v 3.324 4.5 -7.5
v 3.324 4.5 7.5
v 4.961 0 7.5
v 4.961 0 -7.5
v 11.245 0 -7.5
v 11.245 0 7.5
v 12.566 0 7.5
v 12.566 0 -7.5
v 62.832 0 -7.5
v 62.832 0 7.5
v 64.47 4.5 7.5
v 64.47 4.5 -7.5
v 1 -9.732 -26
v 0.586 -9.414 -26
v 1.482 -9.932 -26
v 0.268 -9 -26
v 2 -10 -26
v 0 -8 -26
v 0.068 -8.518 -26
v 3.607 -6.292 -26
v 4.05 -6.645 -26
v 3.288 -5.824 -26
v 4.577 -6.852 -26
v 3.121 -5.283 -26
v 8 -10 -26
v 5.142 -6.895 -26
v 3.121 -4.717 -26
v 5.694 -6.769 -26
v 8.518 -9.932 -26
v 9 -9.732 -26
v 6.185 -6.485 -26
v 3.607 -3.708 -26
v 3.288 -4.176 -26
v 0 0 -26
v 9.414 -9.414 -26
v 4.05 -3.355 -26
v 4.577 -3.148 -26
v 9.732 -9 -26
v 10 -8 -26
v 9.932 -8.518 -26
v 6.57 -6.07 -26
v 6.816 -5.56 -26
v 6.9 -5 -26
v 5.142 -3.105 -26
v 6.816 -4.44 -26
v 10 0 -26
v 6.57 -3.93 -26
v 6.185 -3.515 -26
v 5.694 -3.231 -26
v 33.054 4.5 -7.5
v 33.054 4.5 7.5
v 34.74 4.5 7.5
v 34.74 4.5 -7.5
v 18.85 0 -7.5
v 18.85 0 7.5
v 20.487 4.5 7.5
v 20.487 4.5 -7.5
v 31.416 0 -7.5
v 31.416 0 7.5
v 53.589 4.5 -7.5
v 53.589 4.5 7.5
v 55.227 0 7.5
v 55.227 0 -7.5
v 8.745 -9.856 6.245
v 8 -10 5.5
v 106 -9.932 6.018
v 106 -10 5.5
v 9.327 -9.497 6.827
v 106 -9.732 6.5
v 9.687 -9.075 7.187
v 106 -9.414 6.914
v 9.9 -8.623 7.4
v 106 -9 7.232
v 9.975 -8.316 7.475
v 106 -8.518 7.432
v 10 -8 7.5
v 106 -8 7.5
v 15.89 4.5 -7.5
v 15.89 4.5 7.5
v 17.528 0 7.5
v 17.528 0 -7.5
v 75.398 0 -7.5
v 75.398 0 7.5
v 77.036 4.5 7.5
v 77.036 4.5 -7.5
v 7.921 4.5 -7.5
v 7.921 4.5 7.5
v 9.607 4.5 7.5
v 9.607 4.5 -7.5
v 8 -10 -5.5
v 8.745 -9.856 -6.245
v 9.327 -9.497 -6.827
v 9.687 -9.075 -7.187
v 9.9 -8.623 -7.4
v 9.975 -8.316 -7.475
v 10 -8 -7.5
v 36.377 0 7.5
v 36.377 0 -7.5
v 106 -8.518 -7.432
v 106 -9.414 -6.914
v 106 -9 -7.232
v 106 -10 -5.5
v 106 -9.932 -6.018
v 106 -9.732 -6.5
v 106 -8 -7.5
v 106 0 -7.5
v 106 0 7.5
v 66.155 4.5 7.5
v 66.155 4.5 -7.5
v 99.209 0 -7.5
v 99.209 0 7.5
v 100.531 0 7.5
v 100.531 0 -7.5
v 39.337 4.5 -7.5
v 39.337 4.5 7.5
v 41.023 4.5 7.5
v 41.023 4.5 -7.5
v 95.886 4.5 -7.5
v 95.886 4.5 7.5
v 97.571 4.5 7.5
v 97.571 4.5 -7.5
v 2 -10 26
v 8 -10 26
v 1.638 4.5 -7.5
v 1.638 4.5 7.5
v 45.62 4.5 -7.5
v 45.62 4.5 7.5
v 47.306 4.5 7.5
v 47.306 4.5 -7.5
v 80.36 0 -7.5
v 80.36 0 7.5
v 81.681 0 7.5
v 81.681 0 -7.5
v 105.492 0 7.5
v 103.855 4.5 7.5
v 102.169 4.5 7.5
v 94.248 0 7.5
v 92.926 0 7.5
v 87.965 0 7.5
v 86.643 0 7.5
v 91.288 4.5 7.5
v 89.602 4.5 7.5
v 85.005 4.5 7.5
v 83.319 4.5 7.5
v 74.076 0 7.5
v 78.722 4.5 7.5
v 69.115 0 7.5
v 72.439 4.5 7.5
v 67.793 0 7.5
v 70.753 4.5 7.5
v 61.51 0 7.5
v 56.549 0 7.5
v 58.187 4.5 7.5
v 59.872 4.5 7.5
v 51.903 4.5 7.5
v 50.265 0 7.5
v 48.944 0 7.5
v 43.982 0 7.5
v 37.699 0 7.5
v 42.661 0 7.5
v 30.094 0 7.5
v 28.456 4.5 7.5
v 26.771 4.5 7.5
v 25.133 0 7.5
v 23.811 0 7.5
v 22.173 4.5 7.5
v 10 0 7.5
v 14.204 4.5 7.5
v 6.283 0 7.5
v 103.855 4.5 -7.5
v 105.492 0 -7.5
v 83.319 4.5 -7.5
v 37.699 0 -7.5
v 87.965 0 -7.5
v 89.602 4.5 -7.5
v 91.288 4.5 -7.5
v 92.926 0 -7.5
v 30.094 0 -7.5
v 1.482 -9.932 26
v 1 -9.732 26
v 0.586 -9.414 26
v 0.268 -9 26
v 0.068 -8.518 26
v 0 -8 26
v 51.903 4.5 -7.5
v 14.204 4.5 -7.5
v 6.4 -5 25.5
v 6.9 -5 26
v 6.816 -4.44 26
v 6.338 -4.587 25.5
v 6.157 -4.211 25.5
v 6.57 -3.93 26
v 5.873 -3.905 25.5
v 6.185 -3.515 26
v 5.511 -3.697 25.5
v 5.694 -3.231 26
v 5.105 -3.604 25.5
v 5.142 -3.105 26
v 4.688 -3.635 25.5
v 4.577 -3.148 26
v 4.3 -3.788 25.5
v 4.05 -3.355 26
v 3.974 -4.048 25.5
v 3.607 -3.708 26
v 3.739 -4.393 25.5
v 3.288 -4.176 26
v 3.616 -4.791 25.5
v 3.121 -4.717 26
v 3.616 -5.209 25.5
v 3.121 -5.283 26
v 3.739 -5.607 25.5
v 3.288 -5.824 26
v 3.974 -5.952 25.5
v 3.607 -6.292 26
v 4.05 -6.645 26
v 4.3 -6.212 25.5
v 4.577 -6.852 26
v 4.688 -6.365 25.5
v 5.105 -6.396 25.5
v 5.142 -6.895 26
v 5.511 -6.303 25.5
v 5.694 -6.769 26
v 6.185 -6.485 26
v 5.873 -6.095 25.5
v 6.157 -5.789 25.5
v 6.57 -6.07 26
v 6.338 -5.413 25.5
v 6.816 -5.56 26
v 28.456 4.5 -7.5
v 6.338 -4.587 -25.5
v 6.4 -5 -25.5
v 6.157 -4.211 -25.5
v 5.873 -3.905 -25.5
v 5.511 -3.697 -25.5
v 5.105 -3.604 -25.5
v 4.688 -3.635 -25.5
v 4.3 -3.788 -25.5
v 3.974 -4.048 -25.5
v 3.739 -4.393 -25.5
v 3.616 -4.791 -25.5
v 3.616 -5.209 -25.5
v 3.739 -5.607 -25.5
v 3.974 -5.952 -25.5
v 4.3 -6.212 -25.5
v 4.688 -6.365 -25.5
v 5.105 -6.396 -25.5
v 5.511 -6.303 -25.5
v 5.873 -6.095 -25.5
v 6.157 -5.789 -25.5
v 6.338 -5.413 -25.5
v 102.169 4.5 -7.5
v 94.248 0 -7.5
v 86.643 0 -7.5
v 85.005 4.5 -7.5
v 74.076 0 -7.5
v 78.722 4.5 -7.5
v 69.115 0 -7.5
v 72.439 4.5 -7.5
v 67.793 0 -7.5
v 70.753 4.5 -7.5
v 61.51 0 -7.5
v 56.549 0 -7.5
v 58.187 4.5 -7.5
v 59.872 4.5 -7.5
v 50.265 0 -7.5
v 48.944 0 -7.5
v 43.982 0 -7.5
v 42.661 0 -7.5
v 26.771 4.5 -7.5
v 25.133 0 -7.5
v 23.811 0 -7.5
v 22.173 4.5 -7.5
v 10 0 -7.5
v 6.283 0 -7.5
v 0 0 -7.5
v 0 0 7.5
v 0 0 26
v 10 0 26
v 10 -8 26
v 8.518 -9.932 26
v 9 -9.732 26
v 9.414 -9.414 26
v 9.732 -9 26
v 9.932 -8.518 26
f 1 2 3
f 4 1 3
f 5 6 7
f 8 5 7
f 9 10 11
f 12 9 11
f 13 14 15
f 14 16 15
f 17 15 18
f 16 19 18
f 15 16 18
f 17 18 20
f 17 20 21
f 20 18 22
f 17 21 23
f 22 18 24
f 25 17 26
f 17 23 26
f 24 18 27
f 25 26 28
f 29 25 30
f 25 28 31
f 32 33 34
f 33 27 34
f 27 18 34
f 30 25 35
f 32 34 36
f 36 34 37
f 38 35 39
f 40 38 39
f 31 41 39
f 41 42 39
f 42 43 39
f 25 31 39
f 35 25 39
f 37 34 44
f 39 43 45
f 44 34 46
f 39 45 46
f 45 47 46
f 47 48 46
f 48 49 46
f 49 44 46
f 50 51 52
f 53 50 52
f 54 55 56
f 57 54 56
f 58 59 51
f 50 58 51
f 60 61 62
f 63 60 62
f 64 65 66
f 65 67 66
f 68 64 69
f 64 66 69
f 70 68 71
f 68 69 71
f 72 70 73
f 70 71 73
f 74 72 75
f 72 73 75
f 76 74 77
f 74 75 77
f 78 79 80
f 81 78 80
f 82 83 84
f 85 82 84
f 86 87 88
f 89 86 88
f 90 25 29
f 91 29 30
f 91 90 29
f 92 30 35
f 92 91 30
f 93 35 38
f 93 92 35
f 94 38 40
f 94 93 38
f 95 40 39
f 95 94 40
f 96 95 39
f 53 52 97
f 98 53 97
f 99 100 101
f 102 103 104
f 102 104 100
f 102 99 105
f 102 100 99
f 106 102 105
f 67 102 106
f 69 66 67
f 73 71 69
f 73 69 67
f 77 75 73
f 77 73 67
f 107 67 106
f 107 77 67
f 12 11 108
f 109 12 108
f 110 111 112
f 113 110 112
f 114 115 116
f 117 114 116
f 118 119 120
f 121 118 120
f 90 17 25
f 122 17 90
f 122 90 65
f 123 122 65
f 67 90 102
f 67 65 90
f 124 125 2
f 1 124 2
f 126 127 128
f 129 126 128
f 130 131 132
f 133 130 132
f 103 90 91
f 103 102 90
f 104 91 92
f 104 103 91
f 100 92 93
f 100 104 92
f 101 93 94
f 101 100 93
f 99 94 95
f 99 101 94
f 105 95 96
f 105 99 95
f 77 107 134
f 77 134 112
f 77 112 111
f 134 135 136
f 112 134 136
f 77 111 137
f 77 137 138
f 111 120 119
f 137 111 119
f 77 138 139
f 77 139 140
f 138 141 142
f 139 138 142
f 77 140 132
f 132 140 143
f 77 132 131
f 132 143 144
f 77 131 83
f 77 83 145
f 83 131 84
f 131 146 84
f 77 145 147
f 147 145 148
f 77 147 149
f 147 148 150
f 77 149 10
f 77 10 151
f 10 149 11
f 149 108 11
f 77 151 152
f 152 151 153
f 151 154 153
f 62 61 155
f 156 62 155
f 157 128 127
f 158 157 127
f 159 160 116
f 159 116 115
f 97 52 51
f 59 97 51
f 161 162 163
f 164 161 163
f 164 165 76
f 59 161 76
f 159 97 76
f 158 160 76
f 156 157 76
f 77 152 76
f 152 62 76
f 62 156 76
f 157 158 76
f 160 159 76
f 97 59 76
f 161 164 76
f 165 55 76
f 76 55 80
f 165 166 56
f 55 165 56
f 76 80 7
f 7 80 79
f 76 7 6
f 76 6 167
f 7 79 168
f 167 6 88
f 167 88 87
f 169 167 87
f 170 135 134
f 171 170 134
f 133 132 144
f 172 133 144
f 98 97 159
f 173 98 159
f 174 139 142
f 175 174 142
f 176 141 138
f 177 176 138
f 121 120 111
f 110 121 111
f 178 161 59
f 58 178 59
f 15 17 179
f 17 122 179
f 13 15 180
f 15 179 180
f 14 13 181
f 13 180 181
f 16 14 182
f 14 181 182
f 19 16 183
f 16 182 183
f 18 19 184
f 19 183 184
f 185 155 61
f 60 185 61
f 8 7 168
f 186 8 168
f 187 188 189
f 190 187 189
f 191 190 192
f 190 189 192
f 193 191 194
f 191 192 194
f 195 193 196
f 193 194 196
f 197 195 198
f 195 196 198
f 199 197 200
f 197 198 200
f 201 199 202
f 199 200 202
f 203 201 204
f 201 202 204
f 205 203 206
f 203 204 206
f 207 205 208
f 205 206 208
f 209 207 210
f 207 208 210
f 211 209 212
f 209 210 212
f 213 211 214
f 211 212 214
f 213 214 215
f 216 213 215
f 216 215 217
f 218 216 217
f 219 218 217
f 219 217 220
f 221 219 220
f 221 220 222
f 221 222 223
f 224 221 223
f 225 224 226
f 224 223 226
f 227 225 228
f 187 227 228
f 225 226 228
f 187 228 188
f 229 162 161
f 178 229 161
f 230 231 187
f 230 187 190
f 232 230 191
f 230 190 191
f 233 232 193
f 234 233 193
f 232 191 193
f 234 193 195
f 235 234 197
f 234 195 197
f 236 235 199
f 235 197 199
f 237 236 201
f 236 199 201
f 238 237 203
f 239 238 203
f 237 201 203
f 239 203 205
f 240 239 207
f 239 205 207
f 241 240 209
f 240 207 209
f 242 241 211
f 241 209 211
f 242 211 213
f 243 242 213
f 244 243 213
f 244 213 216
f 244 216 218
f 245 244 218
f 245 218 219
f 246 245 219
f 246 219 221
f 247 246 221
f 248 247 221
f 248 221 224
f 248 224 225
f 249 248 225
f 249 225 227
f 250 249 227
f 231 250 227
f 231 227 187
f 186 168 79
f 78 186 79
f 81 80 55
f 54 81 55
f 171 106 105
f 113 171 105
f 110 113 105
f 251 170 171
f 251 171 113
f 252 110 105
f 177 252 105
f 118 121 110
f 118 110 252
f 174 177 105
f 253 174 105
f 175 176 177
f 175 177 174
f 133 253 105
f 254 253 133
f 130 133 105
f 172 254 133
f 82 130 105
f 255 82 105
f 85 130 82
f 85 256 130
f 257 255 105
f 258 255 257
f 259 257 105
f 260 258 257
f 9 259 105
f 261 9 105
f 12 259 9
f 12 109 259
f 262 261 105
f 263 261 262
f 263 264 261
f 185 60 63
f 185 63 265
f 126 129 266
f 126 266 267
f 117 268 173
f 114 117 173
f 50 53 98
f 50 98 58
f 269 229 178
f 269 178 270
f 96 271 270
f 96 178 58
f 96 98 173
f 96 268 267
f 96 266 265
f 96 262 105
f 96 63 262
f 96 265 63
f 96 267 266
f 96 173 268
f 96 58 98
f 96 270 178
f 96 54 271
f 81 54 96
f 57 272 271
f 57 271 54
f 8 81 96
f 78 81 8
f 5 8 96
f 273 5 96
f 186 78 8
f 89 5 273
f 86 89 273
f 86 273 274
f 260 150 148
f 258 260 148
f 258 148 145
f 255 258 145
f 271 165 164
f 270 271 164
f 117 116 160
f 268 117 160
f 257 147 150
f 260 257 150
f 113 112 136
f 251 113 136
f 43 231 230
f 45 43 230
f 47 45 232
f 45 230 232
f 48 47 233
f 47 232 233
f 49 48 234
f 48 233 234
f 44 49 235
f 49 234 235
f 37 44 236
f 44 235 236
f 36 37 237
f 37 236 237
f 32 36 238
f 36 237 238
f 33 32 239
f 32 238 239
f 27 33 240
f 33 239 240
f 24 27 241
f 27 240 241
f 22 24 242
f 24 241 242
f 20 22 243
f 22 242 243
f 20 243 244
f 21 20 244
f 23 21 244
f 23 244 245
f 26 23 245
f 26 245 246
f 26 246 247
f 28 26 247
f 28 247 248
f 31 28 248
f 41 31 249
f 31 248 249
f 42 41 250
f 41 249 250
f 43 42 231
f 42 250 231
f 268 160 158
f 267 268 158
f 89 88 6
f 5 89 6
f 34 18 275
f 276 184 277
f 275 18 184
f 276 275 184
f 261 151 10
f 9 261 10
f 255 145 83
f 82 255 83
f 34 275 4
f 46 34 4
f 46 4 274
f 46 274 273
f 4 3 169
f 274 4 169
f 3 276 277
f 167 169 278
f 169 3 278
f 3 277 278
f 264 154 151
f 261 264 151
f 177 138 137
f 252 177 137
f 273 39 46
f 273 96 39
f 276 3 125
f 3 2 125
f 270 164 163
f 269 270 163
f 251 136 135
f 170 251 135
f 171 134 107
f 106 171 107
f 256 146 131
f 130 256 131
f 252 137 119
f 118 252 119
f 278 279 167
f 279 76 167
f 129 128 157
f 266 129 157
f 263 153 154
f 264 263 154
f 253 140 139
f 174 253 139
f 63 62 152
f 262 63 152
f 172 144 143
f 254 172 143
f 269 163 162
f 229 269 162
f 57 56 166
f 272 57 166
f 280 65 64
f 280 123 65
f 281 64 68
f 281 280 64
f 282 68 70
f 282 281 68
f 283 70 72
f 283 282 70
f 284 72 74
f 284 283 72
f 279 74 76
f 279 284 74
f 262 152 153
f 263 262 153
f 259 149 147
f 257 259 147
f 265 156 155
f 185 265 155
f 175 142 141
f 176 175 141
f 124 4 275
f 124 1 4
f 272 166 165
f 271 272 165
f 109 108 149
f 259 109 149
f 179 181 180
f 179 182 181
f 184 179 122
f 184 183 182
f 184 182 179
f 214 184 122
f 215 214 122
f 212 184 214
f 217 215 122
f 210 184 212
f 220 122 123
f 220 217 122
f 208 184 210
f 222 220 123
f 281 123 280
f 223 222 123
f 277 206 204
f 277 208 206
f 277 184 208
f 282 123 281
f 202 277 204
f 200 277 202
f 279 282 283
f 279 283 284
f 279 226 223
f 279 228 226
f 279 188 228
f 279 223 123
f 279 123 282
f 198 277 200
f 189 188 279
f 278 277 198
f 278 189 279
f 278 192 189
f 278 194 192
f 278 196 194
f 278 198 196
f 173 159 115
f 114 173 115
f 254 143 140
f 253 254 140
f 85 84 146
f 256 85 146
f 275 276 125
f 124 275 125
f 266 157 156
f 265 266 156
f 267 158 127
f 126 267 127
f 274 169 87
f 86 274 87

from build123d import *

# Parameters (mm, degrees)
SKETCH_1_W             = 106
SKETCH_1_H             = 10
EXTRUDE_1_DEPTH        = 7.5
EXTRUDE_2_DEPTH        = 15
PATTERN_LINEAR_1_COUNT = 17
PATTERN_LINEAR_1_PITCH = 6.283185307
SKETCH_3_W             = 10
SKETCH_3_H             = 10
EXTRUDE_1_2_DEPTH      = 18.5
SKETCH_4_R             = 1.4
CUT_EXTRUDE_1_DEPTH    = 119.490505949
FILLET_2_R             = 2
FILLET_3_R             = 2
CHAMFER_1_SIZE         = 0.5


with BuildPart() as part:
    # 草图1 → Extrude 1 (new, symmetric)
    with BuildSketch(Plane.XY):
        with Locations((53, -5)):
            Rectangle(SKETCH_1_W, SKETCH_1_H)
    extrude(amount=EXTRUDE_1_DEPTH, both=True)

    # 草图2 → 拉伸2 (add)
    with BuildSketch(Plane.XY.offset(7.5)):
        Polygon((0, 0), (1.637866054, 4.5), (3.323577771, 4.5), (4.961443825, 0), align=None)
    extrude_2 = extrude(amount=-EXTRUDE_2_DEPTH)

    # 阵列(线性)1: 拉伸2 ×17
    with Locations(*[(i * PATTERN_LINEAR_1_PITCH, 0, 0) for i in range(1, PATTERN_LINEAR_1_COUNT)]):
        add(extrude_2)

    # 草图3 → Extrude 1 2 (add)
    with BuildSketch(Plane.XY.offset(7.5)):
        with Locations((5, -5)):
            Rectangle(SKETCH_3_W, SKETCH_3_H)
    extrude_1_2 = extrude(amount=EXTRUDE_1_2_DEPTH)

    # 镜向1: Extrude 1 2 across plane
    add(extrude_1_2.mirror(Plane.XY))

    # 草图4 → 切除-拉伸1 (cut, through all)
    with BuildSketch(Plane.XY.offset(26)):
        with Locations((5, -5)):
            Circle(SKETCH_4_R)
    extrude(amount=-CUT_EXTRUDE_1_DEPTH, mode=Mode.SUBTRACT)

    # 圆角2
    fillet_2_edges = [part.edges().sort_by_distance(p)[0] for p in [
        (58, -10, 7.5),
        (58, -10, -7.5),
    ]]
    fillet(fillet_2_edges, radius=FILLET_2_R)

    # 圆角3
    fillet_3_edges = [part.edges().sort_by_distance(p)[0] for p in [
        (10, -10, 15.75),
        (10, -10, -15.75),
        (0, -10, 0),
    ]]
    fillet(fillet_3_edges, radius=FILLET_3_R)

    # 倒角1
    chamfer_1_edges = [part.edges().sort_by_distance(p)[0] for p in [
        (3.6, -5, -26),
        (3.6, -5, 26),
    ]]
    chamfer(chamfer_1_edges, length=CHAMFER_1_SIZE)


solid = part.part
